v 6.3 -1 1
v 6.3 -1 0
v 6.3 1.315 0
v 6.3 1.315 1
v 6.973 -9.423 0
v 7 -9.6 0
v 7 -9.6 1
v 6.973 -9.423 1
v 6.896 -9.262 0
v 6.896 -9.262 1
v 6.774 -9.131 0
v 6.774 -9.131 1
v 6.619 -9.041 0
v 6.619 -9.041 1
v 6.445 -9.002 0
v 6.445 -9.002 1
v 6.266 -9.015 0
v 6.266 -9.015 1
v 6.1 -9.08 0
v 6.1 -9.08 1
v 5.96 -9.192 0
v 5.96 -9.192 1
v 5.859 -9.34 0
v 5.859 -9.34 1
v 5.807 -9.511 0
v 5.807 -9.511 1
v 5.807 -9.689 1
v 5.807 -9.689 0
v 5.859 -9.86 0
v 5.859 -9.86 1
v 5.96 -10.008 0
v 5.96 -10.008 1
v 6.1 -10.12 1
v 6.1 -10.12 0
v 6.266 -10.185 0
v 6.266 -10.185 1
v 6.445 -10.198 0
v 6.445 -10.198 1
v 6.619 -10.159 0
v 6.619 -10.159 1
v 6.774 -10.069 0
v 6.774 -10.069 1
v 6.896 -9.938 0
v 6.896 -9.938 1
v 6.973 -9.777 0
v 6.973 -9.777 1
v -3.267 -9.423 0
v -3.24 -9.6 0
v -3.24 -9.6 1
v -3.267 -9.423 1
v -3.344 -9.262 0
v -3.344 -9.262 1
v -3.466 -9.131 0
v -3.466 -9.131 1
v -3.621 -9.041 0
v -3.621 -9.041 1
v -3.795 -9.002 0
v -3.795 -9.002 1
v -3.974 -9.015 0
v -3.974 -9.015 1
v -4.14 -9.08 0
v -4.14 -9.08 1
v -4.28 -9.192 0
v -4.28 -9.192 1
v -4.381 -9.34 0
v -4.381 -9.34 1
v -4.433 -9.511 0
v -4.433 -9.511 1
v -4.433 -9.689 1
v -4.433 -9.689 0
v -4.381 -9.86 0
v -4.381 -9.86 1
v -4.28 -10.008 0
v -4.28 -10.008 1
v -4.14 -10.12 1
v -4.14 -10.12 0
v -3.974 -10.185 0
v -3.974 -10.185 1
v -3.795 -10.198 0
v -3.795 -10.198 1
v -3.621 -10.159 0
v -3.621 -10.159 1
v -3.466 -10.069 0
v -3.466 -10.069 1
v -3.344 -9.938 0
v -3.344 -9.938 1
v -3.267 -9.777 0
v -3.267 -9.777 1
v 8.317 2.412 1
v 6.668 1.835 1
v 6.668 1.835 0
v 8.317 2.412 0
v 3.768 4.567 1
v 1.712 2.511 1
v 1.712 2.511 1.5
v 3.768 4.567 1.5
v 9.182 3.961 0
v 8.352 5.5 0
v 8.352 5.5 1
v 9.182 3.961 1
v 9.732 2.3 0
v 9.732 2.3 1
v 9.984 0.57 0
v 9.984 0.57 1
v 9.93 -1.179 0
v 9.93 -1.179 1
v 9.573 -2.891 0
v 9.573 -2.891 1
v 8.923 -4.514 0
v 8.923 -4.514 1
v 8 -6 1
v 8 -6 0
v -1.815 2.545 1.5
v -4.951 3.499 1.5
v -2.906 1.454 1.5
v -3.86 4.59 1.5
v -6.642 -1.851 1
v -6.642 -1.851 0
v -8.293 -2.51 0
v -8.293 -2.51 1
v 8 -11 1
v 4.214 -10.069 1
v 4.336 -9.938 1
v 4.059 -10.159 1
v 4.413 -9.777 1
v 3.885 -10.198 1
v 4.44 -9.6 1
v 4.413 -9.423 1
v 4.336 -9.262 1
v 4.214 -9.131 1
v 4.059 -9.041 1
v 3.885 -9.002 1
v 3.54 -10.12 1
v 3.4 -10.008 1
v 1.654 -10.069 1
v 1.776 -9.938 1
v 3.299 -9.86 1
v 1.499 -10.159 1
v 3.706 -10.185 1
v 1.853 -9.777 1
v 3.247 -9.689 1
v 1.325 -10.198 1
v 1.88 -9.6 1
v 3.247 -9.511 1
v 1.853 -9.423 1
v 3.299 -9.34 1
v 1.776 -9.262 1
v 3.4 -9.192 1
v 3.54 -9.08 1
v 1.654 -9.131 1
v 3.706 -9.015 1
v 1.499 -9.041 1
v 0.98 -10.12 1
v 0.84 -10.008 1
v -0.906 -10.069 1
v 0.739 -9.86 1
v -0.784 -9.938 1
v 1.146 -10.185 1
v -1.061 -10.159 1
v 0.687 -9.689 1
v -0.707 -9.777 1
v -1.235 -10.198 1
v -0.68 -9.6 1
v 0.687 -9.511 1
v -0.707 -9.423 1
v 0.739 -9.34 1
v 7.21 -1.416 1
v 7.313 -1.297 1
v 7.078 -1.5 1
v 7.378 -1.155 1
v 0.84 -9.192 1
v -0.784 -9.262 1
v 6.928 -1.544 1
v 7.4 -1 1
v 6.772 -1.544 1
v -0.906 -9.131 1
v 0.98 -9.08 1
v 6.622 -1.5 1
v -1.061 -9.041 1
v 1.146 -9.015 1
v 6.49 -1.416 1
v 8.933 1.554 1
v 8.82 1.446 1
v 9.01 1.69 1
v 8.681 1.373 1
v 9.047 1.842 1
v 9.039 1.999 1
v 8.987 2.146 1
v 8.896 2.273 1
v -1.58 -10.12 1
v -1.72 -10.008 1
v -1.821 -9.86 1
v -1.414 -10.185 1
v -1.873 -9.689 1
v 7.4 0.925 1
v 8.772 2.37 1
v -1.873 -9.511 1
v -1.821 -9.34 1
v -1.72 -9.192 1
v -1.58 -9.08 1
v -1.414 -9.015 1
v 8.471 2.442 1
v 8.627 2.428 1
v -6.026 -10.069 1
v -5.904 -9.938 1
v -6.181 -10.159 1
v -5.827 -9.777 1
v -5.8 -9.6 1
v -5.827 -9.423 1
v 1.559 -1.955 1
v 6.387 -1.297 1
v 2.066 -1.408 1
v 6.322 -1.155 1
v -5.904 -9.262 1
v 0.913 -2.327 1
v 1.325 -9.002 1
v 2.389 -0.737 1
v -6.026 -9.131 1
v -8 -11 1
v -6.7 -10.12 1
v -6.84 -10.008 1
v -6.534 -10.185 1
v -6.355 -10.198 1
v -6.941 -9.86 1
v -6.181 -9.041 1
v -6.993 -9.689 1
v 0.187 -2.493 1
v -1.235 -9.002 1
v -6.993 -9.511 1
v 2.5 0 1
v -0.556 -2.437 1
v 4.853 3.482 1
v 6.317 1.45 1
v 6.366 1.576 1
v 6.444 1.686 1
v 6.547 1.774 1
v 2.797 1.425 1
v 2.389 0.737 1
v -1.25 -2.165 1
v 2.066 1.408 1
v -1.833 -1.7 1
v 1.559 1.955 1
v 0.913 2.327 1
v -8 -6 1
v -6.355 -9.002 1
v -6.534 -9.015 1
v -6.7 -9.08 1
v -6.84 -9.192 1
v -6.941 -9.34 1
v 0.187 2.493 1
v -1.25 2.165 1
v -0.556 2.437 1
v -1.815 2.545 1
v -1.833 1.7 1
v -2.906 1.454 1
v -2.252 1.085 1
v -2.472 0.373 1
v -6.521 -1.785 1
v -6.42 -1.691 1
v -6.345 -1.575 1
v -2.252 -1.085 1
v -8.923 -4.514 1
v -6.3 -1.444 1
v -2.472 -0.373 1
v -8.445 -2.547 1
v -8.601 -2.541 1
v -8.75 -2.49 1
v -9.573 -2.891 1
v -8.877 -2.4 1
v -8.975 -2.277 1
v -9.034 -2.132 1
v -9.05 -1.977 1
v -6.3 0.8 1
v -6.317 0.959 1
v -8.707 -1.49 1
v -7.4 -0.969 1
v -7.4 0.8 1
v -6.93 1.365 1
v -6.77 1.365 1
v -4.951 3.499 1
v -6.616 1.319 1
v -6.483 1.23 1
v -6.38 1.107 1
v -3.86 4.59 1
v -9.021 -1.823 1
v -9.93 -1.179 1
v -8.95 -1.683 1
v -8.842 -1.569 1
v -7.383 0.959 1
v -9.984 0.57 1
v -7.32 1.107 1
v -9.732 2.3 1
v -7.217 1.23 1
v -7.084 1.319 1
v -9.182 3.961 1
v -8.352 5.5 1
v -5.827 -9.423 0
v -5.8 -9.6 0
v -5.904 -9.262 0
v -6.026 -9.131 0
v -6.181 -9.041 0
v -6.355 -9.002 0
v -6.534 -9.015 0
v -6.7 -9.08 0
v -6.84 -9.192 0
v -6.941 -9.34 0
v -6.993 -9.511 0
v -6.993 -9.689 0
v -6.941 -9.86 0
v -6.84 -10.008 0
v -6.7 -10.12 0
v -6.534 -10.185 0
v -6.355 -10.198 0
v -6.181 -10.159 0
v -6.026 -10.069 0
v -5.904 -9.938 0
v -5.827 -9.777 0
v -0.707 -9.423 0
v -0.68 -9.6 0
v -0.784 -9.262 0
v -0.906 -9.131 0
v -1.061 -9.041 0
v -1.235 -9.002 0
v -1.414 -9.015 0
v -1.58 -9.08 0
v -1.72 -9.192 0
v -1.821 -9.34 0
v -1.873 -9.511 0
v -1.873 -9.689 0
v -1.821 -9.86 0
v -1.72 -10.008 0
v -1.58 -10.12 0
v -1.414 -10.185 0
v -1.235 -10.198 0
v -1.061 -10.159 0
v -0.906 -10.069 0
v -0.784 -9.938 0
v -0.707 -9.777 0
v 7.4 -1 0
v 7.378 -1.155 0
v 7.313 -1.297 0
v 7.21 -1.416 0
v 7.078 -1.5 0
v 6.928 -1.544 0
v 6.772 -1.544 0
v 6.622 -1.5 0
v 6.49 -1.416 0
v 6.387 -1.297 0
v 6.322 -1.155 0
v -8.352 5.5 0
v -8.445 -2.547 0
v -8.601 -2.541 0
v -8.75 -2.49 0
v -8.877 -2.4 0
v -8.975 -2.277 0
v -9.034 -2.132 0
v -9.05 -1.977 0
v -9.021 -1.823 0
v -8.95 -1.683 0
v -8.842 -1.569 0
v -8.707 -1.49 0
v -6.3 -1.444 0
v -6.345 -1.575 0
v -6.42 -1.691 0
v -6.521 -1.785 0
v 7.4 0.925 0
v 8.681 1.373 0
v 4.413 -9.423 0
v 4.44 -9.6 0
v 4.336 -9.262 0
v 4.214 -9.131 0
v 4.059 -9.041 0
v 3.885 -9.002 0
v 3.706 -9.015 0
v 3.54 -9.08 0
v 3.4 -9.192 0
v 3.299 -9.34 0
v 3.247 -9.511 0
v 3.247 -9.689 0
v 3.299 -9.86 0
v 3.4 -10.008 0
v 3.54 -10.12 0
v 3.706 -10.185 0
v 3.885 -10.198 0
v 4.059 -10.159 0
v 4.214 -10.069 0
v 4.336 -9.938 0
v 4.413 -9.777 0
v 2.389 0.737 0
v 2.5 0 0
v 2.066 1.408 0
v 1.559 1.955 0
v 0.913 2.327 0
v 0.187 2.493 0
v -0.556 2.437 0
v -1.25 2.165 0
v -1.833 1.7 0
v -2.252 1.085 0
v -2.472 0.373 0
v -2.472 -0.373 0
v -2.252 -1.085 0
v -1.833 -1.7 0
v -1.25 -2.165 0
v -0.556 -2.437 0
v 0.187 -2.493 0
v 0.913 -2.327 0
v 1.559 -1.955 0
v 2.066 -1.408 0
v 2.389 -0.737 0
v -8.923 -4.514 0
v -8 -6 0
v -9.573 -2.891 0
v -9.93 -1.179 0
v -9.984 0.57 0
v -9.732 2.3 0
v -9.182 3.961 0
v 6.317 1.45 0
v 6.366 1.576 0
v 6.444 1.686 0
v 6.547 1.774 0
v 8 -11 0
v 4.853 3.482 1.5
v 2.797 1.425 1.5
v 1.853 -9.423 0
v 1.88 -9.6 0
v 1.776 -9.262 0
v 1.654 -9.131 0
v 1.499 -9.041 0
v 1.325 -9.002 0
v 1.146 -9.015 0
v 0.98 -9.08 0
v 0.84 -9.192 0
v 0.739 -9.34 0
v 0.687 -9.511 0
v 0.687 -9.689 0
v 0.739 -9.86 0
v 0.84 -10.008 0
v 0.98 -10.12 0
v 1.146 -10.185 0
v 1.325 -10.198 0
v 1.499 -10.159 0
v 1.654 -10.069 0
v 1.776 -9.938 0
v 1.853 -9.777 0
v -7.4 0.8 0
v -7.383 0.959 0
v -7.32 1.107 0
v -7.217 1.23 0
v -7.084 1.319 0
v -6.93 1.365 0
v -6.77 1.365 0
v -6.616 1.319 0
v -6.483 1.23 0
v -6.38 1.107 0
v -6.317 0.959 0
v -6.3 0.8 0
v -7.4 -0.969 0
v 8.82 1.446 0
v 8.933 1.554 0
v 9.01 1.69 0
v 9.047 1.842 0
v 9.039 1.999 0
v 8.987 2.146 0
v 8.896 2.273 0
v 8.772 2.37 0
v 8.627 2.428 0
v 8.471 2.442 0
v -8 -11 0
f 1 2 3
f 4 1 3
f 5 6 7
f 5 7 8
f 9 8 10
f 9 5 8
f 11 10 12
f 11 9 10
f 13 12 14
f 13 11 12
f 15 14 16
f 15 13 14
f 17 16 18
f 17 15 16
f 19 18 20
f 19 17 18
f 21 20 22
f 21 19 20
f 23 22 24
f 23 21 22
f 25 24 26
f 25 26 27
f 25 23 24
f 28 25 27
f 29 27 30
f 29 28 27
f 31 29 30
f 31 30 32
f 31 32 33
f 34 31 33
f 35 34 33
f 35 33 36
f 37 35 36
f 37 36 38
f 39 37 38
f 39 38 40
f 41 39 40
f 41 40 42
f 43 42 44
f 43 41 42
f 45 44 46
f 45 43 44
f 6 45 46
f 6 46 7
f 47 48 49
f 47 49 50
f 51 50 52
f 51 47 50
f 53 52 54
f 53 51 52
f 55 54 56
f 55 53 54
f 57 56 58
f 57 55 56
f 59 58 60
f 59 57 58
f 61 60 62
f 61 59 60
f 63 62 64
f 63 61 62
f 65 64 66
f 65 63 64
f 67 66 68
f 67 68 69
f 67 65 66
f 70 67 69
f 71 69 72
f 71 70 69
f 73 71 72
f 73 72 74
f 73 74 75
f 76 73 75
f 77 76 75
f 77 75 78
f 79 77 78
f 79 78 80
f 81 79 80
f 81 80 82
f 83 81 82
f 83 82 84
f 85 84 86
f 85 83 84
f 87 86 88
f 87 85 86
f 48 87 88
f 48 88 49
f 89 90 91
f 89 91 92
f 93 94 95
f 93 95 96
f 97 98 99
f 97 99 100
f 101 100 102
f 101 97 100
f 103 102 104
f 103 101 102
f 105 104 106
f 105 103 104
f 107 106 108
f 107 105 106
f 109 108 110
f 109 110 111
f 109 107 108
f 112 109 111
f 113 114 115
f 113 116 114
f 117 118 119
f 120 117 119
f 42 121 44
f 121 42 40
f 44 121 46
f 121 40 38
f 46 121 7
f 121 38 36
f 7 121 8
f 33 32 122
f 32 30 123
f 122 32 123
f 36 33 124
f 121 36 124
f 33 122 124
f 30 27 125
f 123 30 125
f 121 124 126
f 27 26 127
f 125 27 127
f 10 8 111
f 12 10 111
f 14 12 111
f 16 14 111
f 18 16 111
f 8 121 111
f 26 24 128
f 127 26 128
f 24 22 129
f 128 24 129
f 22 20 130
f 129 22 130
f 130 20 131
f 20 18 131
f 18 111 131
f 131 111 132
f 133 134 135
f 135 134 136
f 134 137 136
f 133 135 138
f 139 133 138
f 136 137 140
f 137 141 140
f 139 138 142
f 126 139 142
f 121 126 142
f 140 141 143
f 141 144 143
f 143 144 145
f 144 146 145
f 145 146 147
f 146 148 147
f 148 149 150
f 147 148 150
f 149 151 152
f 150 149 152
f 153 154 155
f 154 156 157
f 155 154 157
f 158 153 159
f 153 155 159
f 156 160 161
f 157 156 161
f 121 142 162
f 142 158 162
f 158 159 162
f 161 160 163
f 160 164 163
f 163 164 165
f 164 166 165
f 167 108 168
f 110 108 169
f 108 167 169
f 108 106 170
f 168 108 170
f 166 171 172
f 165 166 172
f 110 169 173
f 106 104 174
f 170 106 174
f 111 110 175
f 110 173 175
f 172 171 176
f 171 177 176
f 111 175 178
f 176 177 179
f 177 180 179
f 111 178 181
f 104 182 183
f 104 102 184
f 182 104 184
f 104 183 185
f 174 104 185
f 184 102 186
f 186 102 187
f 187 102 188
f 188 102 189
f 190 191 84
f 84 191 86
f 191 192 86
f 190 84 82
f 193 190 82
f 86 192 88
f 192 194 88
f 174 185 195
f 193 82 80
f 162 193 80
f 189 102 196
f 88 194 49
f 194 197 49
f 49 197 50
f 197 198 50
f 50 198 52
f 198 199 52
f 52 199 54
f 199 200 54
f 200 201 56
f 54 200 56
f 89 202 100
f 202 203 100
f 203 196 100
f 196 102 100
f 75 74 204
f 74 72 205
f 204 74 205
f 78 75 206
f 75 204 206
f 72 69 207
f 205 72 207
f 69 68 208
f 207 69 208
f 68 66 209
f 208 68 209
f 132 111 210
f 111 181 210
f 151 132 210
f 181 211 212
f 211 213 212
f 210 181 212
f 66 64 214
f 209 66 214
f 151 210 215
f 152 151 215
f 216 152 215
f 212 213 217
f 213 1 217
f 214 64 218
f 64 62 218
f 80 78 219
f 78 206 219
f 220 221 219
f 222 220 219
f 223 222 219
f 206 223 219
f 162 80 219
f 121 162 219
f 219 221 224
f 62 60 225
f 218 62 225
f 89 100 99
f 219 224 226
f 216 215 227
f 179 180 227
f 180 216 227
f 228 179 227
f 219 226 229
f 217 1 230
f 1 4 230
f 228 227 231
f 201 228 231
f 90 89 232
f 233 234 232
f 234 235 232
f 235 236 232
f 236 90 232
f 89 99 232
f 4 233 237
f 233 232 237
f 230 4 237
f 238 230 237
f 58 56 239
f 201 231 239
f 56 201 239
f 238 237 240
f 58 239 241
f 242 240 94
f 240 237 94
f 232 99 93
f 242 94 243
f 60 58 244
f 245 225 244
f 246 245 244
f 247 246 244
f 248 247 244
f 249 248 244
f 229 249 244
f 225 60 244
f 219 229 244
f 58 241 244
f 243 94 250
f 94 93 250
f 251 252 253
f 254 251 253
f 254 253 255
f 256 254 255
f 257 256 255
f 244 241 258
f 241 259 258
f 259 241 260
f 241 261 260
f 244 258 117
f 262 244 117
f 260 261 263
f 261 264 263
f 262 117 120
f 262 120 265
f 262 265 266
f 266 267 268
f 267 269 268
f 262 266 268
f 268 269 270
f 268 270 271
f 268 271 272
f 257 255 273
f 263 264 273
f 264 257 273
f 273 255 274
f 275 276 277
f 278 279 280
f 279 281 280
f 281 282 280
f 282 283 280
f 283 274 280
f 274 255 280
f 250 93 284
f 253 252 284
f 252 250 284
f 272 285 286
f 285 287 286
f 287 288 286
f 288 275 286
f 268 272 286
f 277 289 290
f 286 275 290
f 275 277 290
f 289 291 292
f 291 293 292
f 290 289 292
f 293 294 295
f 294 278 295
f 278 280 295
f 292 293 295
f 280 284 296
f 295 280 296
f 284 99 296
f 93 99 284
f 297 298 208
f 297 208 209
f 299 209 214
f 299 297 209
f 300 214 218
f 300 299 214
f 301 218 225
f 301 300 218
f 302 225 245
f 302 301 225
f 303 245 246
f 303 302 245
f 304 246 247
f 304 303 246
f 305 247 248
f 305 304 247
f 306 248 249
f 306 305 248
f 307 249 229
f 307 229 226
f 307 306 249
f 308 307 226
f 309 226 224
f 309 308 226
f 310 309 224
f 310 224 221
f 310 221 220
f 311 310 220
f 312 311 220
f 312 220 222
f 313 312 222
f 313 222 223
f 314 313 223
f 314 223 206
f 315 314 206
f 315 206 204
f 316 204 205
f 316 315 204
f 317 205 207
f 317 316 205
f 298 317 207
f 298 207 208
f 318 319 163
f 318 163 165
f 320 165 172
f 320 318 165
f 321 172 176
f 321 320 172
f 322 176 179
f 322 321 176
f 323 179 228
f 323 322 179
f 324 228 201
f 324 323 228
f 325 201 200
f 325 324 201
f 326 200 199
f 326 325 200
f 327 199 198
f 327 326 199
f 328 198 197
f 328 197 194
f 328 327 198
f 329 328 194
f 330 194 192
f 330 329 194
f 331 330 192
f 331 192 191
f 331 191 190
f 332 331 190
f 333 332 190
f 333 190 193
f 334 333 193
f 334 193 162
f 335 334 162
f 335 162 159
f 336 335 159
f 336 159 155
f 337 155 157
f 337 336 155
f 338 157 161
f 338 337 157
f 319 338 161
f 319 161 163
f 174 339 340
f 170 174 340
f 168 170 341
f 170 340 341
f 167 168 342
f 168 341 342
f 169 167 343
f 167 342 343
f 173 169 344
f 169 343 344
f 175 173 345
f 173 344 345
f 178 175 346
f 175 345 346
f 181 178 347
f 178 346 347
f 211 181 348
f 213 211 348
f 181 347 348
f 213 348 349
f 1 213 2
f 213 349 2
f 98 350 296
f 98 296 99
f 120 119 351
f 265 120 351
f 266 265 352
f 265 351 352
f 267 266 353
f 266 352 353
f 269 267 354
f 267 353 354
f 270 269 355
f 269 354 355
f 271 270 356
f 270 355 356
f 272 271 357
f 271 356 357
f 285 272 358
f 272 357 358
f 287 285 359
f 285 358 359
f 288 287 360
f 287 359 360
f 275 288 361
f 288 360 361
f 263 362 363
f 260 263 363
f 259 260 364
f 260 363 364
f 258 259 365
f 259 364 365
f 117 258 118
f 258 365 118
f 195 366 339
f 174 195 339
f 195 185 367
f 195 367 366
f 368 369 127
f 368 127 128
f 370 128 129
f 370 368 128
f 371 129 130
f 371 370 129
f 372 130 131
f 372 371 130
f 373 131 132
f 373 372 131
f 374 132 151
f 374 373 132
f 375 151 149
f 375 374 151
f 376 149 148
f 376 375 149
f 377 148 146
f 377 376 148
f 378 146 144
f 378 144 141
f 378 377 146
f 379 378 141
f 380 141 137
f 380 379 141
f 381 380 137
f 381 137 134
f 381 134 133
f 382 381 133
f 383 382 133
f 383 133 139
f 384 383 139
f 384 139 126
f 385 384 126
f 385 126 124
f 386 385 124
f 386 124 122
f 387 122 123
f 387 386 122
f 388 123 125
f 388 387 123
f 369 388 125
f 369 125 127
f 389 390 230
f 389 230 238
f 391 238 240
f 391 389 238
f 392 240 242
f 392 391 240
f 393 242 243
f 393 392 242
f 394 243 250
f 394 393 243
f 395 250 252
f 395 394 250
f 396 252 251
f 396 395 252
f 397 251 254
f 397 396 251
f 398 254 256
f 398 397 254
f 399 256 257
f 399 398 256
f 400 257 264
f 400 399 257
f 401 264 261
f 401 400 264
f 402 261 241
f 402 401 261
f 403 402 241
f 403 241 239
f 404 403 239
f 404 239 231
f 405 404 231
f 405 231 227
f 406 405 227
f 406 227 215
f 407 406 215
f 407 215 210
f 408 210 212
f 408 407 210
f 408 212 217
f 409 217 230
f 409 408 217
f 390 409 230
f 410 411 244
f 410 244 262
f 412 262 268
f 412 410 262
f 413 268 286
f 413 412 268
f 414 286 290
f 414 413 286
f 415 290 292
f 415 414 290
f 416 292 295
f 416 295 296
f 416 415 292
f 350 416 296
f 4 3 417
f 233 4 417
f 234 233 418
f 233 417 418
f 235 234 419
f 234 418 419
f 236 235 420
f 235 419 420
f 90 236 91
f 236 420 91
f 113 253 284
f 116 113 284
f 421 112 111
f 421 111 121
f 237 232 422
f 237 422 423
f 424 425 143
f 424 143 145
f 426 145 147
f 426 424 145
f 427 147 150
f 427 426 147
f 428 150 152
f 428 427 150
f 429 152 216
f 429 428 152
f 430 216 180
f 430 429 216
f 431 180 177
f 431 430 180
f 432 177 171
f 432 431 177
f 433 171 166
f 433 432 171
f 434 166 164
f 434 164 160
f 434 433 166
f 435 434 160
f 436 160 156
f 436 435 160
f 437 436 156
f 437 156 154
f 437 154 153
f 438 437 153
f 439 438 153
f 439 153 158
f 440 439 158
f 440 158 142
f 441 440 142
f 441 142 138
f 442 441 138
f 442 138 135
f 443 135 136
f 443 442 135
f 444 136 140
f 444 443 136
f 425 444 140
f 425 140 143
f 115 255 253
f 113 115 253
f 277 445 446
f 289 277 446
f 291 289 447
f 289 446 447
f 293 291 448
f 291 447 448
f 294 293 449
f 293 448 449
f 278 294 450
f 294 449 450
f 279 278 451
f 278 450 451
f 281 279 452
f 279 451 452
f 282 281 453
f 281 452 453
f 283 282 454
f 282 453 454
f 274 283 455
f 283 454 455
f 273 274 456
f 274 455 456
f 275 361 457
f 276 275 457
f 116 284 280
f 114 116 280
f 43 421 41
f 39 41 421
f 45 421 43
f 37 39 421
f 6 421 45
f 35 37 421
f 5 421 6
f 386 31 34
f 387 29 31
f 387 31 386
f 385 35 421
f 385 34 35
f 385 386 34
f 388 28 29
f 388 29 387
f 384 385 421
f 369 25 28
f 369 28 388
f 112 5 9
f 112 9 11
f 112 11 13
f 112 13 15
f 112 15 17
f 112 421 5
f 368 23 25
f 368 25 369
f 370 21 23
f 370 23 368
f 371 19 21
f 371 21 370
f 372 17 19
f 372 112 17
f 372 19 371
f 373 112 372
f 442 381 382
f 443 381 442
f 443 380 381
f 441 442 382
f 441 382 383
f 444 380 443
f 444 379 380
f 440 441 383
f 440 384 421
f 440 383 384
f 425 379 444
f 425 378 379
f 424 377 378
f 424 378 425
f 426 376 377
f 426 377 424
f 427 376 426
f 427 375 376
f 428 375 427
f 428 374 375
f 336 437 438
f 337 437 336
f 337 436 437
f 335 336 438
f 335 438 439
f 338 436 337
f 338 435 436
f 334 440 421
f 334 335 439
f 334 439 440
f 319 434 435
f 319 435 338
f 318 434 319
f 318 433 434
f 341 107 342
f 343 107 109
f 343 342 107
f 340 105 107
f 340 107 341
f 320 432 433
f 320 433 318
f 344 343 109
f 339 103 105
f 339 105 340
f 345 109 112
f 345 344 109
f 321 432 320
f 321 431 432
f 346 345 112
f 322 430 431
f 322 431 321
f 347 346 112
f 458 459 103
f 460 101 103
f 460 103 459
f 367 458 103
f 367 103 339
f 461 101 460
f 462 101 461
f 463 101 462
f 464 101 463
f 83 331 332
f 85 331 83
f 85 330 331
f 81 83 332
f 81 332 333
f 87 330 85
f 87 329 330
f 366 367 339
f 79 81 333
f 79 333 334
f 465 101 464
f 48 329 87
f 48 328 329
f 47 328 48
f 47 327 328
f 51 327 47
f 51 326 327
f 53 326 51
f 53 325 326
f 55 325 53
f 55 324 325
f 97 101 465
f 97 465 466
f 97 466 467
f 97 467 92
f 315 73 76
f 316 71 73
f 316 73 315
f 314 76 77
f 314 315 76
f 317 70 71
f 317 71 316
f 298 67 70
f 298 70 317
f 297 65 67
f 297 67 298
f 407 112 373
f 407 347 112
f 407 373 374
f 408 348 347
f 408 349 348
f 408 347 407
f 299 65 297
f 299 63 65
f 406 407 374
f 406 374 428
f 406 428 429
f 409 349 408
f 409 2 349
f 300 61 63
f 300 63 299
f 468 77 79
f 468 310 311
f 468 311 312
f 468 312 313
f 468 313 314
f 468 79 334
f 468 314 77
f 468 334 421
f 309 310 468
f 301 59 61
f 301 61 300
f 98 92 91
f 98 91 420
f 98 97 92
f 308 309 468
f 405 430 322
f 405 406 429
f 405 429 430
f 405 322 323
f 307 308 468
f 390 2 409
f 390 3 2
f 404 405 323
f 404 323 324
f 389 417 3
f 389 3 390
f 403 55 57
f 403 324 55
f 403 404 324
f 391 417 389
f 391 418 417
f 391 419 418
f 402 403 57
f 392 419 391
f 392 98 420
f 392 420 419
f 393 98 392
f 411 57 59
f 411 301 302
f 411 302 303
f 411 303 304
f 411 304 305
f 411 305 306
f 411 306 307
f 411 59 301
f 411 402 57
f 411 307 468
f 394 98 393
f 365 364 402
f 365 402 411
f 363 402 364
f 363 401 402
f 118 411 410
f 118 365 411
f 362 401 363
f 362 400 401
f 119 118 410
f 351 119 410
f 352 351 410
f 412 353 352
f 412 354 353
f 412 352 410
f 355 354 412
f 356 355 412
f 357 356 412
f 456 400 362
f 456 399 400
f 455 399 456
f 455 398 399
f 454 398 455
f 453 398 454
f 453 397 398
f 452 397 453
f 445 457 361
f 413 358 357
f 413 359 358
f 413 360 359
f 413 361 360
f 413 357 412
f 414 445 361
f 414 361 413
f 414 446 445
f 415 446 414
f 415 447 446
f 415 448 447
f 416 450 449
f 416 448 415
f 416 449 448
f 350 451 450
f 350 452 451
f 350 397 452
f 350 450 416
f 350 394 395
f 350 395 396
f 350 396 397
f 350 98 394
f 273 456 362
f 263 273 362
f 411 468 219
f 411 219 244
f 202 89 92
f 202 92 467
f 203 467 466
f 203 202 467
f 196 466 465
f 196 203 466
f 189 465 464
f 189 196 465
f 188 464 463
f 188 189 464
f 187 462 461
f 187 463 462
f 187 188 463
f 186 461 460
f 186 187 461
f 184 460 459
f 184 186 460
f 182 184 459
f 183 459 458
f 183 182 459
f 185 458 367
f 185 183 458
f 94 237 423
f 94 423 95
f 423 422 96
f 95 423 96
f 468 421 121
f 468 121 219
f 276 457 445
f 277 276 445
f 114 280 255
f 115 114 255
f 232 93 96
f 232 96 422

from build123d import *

# Parameters (mm, degrees)
ESQUISSE1_R             = 2.5
ESQUISSE1_R_2           = 0.6
BOSS_EXTRU_1_DEPTH      = 1
ENL_V_MAT_EXTRU_1_DEPTH = 15.899664426
BOSS_EXTRU_2_DEPTH      = 0.5
BOSS_EXTRU_3_DEPTH      = 0.5


with BuildPart() as part:
    # Esquisse1 → Boss.-Extru.1 (new body)
    with BuildSketch(Plane.XY):
        with BuildLine():
            Line((-8.351646544, 5.5), (8.351646544, 5.5))
            ThreePointArc((8.351646544, 5.5), (9.995328218, -0.30563675), (8, -6))
            Line((8, -6), (8, -11))
            Line((8, -11), (-8, -11))
            Line((-8, -11), (-8, -6))
            ThreePointArc((-8, -6), (-9.995328218, -0.30563675), (-8.351646544, 5.5))
        make_face()
        Circle(ESQUISSE1_R, mode=Mode.SUBTRACT)
        with Locations((-6.4, -9.6)):
            Circle(ESQUISSE1_R_2, mode=Mode.SUBTRACT)
        with Locations((-3.84, -9.6)):
            Circle(ESQUISSE1_R_2, mode=Mode.SUBTRACT)
        with Locations((-1.28, -9.6)):
            Circle(ESQUISSE1_R_2, mode=Mode.SUBTRACT)
        with Locations((1.28, -9.6)):
            Circle(ESQUISSE1_R_2, mode=Mode.SUBTRACT)
        with Locations((3.84, -9.6)):
            Circle(ESQUISSE1_R_2, mode=Mode.SUBTRACT)
        with Locations((6.4, -9.6)):
            Circle(ESQUISSE1_R_2, mode=Mode.SUBTRACT)
        with BuildLine():
            Line((-6.3, 0.8), (-6.3, -1.444183839))
            ThreePointArc((-6.3, -1.444183839), (-6.419746949, -1.690835185), (-6.641967863, -1.851440553))
            Line((-6.641967863, -1.851440553), (-8.292953638, -2.509553847))
            ThreePointArc((-8.292953638, -2.509553847), (-9.009553847, -2.207046362), (-8.707046362, -1.490446153))
            Line((-8.707046362, -1.490446153), (-7.4, -0.969433434))
            Line((-7.4, -0.969433434), (-7.4, 0.8))
            ThreePointArc((-7.4, 0.8), (-6.85, 1.370822155), (-6.3, 0.8))
        make_face(mode=Mode.SUBTRACT)
        with BuildLine():
            Line((7.4, 1.315402872), (7.4, -1))
            ThreePointArc((7.4, -1), (6.85, -1.55), (6.3, -1))
            Line((6.3, -1), (6.3, 1.315402872))
            ThreePointArc((6.3, 1.315402872), (6.85, 1.865402872), (7.4, 1.315402872))
        make_face(mode=Mode.SUBTRACT)
    extrude(amount=BOSS_EXTRU_1_DEPTH)

    # Esquisse2 → Enlèv. mat.-Extru.1 (cut, through all)
    with BuildSketch(Plane.XY.offset(1)):
        with BuildLine():
            Line((6.668307266, 1.834524968), (8.317330789, 2.411683201))
            ThreePointArc((8.317330789, 2.411683201), (9.018145619, 2.074253838), (8.680716257, 1.373439009))
            Line((8.680716257, 1.373439009), (7.031692734, 0.796280776))
            ThreePointArc((7.031692734, 0.796280776), (6.330877904, 1.133710138), (6.668307266, 1.834524968))
        make_face()
    extrude(amount=-ENL_V_MAT_EXTRU_1_DEPTH, mode=Mode.SUBTRACT)

    # Esquisse3 → Boss.-Extru.2 (add)
    with BuildSketch(Plane.XY.offset(1)):
        Polygon((-4.950824849, 3.498836933), (-2.906168647, 1.454180731), (-1.81491955, 2.545429827), (-3.859575753, 4.59008603), align=None)
    extrude(amount=BOSS_EXTRU_2_DEPTH)

    # Esquisse4 → Boss.-Extru.3 (add)
    with BuildSketch(Plane.XY.offset(1)):
        Polygon((1.711538057, 2.510969329), (3.767681092, 4.567112364), (4.853186772, 3.481606684), (2.797043737, 1.425463649), align=None)
    extrude(amount=BOSS_EXTRU_3_DEPTH)


solid = part.part
